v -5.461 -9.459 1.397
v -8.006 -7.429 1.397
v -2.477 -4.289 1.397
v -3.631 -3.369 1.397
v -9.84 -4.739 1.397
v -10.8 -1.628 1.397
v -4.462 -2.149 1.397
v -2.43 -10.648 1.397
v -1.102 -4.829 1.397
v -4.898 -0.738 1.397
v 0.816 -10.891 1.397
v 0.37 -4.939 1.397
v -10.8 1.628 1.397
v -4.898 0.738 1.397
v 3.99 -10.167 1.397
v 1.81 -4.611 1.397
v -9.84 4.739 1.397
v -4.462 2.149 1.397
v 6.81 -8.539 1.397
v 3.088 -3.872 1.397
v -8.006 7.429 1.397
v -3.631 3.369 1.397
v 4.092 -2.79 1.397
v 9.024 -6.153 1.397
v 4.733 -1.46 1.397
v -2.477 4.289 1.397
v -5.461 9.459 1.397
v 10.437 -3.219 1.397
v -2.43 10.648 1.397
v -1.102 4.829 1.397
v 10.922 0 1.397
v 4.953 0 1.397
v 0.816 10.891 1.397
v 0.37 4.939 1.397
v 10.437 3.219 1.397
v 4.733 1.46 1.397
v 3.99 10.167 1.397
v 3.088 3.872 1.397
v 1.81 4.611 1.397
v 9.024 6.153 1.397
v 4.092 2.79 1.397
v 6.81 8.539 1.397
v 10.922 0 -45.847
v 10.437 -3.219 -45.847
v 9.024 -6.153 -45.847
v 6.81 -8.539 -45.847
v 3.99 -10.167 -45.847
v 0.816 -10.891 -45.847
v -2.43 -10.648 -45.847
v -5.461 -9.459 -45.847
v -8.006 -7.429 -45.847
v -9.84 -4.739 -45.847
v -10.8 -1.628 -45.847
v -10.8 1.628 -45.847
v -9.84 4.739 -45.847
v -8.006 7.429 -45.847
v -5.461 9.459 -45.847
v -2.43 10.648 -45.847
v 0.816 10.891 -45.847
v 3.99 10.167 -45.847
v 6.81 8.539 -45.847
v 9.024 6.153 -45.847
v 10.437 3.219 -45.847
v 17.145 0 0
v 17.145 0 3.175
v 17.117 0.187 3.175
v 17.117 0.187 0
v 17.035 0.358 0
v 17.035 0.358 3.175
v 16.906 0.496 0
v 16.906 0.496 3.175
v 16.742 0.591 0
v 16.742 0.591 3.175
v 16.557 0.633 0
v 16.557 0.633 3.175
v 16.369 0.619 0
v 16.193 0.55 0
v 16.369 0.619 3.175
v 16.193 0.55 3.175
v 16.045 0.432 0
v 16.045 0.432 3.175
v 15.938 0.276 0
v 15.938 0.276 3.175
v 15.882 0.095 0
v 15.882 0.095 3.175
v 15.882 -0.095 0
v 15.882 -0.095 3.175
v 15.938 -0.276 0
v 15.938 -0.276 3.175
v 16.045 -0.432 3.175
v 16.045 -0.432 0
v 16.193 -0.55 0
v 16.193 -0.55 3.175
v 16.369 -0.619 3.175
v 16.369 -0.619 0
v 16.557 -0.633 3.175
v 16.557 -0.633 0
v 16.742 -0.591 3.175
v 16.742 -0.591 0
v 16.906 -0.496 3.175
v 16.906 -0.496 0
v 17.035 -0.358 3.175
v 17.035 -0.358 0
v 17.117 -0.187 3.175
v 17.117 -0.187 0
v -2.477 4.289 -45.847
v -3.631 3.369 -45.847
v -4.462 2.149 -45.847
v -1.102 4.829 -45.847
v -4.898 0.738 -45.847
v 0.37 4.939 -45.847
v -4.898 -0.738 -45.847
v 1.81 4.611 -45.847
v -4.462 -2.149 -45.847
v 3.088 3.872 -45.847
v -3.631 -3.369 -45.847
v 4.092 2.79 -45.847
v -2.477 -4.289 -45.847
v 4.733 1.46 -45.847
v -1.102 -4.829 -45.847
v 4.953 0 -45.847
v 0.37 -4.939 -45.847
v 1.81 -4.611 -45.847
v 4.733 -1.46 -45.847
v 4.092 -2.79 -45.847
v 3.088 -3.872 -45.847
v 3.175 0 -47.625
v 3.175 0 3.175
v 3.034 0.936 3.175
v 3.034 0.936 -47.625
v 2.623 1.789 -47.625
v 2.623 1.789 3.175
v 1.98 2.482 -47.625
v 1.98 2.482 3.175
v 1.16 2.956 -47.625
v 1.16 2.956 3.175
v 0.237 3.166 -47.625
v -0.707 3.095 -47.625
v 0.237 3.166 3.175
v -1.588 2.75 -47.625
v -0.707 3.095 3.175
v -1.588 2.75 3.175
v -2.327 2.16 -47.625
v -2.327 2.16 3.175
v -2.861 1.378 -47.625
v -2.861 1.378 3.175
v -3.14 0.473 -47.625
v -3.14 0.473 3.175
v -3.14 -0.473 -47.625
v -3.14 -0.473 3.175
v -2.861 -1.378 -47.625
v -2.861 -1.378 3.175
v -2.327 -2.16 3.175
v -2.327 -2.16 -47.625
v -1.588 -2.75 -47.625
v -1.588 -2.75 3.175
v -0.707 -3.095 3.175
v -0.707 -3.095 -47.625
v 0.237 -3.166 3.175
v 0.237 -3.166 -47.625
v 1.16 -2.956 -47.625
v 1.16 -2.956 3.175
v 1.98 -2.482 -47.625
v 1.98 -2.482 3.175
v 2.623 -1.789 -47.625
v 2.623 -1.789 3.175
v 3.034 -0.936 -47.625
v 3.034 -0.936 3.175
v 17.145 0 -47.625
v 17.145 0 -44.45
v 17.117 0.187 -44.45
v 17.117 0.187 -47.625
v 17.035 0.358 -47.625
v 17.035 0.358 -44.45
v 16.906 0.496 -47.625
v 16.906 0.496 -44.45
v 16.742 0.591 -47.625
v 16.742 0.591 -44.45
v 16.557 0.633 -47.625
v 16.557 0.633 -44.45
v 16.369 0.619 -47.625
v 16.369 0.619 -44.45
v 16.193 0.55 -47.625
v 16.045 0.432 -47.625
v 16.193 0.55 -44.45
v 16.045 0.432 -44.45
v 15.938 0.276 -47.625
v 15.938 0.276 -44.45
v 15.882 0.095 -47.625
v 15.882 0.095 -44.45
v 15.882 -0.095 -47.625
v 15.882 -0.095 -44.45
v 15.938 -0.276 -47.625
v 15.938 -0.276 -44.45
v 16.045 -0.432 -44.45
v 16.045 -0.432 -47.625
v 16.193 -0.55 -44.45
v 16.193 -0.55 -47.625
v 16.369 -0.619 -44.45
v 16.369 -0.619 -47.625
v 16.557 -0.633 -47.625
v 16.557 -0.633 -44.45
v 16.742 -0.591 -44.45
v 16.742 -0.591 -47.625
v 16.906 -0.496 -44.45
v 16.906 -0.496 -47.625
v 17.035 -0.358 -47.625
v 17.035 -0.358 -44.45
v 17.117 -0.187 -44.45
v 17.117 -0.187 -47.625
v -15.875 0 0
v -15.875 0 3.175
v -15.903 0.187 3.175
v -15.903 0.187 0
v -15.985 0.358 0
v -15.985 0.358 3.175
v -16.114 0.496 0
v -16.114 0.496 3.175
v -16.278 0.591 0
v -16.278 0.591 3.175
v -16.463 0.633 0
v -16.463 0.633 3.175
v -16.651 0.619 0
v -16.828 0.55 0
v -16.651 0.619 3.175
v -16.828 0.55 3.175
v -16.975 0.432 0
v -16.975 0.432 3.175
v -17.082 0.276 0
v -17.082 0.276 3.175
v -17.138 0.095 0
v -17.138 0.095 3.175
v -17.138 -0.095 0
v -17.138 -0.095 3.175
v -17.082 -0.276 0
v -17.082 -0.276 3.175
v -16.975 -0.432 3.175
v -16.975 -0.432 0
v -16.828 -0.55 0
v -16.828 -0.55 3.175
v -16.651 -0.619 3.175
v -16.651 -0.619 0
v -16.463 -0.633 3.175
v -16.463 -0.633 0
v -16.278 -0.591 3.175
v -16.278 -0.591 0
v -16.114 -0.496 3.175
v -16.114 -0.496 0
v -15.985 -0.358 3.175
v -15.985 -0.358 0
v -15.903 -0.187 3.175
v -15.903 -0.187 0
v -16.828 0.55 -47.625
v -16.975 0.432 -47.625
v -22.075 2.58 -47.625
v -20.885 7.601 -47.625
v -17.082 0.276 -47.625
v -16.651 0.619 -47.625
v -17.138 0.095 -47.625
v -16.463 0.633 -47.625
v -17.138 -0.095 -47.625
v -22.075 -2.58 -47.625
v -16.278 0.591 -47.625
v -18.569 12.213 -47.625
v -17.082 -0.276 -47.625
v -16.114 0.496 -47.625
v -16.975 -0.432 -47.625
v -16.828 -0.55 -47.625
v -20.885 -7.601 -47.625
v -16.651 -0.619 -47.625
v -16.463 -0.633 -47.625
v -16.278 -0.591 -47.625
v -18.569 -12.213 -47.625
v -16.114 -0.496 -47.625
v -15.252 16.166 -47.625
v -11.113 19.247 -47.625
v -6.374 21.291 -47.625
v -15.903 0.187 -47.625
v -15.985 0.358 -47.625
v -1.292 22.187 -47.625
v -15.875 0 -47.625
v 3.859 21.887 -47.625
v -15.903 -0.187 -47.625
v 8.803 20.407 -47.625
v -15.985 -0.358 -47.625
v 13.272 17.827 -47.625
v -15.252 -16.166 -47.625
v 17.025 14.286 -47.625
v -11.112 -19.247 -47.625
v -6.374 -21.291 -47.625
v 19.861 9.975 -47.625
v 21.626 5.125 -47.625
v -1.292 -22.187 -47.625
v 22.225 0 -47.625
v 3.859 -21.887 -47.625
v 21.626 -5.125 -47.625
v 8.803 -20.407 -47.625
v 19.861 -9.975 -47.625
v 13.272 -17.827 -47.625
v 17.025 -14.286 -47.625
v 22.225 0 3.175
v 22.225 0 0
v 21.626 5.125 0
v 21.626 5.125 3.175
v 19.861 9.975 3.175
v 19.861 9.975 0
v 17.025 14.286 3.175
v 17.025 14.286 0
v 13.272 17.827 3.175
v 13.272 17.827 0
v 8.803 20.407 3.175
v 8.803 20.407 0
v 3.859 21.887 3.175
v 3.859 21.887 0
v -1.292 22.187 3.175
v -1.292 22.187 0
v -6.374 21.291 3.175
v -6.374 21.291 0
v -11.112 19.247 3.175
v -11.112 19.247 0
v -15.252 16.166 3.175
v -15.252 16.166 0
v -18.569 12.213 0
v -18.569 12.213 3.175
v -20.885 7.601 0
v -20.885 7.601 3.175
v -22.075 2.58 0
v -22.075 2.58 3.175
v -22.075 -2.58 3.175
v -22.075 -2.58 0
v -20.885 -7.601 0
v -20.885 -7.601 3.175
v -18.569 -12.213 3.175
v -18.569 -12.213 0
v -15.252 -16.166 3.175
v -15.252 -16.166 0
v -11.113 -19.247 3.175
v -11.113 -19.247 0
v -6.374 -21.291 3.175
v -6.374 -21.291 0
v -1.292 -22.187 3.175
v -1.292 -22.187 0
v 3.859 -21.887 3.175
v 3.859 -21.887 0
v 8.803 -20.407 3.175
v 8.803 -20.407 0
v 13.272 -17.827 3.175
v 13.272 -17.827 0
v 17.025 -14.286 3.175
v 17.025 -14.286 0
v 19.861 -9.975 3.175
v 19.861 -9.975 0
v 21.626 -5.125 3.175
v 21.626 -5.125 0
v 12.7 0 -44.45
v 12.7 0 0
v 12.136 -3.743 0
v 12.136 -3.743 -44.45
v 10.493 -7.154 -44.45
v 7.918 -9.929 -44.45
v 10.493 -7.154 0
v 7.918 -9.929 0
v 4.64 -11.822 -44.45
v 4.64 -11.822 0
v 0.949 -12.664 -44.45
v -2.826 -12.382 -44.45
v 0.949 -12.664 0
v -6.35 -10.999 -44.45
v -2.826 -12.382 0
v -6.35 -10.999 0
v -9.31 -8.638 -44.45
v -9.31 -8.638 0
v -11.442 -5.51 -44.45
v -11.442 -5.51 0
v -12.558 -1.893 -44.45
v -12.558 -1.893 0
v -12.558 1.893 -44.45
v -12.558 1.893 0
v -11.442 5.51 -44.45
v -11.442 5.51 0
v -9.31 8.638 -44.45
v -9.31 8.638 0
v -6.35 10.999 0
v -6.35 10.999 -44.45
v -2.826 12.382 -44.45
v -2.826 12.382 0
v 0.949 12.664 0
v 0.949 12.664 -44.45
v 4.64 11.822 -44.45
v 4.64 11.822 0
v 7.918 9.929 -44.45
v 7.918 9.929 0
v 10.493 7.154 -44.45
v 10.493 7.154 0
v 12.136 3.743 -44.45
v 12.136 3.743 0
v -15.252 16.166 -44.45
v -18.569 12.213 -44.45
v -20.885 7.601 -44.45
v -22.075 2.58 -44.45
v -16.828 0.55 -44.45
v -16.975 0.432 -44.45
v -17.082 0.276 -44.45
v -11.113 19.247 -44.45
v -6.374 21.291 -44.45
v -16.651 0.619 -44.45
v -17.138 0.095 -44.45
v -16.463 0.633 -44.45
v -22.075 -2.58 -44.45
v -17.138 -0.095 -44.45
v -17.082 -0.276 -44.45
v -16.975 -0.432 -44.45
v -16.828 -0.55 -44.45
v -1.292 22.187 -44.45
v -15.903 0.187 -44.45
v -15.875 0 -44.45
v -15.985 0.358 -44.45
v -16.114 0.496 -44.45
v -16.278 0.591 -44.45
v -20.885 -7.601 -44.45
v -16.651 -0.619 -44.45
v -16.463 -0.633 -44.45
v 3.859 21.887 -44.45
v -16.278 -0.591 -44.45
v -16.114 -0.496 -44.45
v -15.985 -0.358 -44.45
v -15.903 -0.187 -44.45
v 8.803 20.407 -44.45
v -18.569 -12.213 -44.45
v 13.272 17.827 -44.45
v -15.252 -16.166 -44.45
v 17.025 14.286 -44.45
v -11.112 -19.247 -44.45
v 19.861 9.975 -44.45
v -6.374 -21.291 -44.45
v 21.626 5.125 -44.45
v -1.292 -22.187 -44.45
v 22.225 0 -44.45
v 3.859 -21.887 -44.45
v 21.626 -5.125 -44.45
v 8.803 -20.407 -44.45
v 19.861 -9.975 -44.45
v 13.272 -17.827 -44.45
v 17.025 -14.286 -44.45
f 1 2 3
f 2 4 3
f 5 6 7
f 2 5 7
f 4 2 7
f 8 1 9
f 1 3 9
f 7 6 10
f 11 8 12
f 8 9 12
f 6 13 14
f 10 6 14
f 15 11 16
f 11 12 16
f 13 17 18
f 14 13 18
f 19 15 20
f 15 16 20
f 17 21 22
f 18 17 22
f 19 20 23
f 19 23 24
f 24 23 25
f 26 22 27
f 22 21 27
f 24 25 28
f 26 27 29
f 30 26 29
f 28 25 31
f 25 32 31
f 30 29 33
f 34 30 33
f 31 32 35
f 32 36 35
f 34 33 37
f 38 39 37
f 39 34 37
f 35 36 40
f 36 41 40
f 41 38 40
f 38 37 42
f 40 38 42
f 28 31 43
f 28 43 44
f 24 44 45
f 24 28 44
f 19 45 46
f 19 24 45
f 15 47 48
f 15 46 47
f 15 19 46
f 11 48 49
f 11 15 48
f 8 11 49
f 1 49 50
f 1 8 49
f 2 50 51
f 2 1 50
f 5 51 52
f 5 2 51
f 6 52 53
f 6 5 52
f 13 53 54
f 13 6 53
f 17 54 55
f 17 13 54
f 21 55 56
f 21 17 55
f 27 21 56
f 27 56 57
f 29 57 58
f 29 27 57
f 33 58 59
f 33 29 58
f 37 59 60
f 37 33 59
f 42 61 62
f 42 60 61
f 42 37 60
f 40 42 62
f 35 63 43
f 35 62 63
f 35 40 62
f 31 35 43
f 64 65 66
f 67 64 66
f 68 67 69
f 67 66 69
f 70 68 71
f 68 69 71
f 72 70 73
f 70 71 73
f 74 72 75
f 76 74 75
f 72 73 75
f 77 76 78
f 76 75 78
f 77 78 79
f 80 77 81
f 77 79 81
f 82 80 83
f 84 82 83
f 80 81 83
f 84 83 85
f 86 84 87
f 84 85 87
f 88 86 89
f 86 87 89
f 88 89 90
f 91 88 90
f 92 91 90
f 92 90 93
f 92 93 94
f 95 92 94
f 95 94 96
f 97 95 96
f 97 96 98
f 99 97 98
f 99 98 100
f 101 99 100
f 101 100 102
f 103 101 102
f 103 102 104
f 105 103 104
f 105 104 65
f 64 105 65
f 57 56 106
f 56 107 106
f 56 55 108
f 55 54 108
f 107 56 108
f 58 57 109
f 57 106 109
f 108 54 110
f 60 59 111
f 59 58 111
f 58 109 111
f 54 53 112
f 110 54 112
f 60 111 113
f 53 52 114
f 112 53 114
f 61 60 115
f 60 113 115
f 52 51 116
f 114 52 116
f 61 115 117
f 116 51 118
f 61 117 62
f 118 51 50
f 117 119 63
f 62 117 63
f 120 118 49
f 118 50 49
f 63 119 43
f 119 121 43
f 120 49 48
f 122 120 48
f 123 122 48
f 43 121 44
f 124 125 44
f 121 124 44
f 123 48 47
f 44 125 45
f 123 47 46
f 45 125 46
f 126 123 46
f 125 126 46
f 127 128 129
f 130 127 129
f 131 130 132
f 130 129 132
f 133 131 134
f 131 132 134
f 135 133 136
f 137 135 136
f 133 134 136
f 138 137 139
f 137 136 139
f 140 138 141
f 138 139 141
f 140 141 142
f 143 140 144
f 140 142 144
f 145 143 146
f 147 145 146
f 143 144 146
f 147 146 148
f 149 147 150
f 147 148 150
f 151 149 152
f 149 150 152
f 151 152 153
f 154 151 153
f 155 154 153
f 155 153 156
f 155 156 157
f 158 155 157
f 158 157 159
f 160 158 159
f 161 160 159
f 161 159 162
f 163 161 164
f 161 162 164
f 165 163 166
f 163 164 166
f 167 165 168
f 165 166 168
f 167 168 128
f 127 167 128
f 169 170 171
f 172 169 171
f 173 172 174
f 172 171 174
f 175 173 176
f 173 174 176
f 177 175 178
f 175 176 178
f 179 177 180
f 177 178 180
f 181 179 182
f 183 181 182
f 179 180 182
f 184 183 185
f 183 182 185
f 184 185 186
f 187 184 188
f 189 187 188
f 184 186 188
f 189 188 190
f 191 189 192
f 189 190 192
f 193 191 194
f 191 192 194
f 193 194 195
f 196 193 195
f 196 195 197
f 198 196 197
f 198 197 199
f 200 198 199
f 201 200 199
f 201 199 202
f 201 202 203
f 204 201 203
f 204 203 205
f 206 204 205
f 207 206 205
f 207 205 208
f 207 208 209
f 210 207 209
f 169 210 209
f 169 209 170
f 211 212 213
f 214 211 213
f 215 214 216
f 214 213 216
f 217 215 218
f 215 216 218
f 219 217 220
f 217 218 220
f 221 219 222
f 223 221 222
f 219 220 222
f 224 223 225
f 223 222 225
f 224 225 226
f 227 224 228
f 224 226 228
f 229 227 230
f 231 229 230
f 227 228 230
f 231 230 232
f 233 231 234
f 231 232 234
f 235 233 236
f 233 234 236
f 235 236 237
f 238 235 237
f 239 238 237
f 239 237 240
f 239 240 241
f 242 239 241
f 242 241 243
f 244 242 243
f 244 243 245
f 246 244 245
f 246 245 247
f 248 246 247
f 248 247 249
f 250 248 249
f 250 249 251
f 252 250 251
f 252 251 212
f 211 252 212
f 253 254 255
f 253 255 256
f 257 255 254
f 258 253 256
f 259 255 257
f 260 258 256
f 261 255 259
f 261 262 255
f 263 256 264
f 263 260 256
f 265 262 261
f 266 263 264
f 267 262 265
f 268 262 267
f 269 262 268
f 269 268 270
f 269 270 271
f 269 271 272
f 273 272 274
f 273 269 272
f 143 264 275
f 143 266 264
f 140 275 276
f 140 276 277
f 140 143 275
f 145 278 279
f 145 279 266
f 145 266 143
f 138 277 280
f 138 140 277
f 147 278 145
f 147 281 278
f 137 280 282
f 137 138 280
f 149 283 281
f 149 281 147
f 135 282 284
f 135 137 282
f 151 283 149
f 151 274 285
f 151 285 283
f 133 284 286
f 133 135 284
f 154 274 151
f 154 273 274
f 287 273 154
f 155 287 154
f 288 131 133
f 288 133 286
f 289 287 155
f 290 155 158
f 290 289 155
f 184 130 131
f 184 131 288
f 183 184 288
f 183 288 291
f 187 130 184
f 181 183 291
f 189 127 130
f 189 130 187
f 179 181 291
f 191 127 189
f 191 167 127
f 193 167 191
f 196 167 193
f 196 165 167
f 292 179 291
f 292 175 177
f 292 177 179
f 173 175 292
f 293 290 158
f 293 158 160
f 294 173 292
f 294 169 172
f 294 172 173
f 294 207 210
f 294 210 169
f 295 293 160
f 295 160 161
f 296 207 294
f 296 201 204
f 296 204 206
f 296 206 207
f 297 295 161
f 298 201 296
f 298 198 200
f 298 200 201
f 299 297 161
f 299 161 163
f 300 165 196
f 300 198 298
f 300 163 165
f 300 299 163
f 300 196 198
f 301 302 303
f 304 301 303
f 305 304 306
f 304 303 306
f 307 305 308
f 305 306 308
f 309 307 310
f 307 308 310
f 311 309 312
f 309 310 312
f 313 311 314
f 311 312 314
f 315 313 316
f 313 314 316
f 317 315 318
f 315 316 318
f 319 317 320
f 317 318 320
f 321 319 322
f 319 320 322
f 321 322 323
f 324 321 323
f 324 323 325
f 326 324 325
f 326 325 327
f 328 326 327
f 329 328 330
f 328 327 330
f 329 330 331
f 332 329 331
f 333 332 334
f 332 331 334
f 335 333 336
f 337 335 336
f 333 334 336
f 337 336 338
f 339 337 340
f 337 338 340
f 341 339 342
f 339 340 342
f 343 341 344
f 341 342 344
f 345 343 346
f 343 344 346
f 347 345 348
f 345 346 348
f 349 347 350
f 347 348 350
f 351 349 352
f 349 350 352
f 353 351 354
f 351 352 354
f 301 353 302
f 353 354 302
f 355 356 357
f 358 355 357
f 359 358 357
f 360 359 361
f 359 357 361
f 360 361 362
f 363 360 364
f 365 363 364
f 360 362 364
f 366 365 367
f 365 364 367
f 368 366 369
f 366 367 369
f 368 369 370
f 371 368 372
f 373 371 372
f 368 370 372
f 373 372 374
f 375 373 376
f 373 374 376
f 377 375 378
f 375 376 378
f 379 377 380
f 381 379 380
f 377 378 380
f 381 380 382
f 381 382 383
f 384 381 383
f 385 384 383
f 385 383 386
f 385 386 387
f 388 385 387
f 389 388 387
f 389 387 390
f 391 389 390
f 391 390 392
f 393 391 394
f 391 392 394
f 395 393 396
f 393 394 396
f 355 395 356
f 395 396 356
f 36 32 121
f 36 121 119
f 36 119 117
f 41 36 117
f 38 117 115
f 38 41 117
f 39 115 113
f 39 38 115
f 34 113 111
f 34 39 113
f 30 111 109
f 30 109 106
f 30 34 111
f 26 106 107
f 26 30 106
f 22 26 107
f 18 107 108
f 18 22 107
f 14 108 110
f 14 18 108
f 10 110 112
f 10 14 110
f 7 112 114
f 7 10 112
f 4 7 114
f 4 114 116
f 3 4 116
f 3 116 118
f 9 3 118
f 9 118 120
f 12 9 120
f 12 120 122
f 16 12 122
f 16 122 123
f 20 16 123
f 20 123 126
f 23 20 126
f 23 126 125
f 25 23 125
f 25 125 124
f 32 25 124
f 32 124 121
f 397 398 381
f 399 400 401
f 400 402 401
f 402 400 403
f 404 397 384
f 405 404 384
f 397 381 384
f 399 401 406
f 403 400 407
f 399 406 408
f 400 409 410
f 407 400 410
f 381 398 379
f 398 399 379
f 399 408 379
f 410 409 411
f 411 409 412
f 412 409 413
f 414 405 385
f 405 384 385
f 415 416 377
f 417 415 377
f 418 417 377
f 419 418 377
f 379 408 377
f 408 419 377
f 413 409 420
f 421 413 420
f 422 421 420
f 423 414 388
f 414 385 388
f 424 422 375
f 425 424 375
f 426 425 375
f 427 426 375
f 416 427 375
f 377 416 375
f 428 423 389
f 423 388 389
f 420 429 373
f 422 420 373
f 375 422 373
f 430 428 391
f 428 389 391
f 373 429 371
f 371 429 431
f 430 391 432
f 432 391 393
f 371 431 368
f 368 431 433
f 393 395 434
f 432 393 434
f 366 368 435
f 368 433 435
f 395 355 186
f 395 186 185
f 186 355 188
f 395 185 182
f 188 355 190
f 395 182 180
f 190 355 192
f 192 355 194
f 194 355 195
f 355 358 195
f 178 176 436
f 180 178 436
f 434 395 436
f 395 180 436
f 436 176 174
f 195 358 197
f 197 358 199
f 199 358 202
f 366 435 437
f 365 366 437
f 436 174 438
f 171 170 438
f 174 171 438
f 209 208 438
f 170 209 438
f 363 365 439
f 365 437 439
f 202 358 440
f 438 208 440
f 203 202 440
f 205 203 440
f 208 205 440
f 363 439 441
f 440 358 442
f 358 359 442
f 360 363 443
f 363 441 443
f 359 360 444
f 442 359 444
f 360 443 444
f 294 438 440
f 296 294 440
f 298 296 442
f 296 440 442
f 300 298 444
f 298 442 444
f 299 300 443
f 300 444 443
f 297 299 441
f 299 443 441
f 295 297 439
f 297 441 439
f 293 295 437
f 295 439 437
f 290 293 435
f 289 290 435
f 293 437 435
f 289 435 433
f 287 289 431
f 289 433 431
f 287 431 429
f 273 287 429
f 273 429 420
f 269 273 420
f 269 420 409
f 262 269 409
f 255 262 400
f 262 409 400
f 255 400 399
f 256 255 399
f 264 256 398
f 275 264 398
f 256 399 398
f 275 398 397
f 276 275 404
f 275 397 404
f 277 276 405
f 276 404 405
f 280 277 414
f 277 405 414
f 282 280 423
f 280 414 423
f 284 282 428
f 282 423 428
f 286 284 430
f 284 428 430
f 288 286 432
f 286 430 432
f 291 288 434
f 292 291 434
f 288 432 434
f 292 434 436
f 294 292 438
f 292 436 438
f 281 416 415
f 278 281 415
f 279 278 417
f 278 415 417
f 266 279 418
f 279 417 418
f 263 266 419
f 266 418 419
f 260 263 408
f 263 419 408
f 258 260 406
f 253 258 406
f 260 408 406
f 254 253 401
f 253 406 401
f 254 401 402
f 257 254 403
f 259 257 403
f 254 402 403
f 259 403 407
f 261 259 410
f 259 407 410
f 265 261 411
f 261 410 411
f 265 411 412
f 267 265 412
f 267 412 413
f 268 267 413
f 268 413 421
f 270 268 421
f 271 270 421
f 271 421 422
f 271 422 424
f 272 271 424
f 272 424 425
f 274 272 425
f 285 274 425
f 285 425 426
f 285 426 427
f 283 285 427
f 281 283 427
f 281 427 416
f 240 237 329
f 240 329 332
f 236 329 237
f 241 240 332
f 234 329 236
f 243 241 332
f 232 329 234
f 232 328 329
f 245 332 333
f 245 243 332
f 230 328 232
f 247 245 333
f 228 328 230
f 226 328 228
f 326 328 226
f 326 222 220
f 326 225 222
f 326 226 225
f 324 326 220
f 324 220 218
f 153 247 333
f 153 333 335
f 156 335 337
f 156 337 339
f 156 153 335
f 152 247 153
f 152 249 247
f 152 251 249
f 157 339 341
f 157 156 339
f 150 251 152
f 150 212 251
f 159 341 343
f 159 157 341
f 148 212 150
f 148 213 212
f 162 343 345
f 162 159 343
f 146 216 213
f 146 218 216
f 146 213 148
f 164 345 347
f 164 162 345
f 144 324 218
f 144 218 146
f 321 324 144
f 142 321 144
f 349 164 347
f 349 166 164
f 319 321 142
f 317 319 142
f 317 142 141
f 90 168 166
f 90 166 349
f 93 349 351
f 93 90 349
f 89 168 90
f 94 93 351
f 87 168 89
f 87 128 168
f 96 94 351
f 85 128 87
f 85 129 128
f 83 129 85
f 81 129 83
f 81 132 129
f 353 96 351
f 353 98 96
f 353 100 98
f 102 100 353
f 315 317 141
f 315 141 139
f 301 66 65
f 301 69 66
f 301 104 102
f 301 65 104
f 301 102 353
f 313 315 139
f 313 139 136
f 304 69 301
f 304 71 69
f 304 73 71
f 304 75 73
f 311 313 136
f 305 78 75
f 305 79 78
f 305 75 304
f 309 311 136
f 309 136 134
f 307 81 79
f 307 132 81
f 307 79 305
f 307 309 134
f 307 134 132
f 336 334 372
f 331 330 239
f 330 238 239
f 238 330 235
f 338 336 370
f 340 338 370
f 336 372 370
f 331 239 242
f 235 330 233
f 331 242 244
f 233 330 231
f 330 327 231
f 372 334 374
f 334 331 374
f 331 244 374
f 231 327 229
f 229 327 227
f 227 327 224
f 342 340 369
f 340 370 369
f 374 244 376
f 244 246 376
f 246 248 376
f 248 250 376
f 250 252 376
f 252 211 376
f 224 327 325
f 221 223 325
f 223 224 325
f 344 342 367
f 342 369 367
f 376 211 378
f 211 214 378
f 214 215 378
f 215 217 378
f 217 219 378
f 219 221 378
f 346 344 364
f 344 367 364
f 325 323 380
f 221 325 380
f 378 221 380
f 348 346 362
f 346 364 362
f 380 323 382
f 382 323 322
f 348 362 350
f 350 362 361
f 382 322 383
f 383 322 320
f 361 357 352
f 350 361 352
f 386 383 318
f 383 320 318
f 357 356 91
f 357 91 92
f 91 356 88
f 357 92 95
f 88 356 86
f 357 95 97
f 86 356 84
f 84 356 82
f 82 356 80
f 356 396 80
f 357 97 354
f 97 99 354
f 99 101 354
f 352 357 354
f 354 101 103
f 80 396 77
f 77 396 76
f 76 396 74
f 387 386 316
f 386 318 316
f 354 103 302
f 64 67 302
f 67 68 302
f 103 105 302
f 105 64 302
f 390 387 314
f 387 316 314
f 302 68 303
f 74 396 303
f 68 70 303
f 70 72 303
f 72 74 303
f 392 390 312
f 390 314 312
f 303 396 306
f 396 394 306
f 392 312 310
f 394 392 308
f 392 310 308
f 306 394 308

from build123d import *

# Parameters (mm, degrees)
F0_R     = 22.225
F1_DEPTH = 3.175
F2_R     = 12.7
F3_DEPTH = 44.45
F4_R     = 22.225
F5_DEPTH = 3.175
F6_R     = 0.635
F7_DEPTH = 50.8
F8_T     = -1.778


# Not quite as in the source:
# - a length typed as a fraction of an inch, garbled in the dataset ("3 / 203.2 mm" for 3/8 in), is restored


with BuildPart() as f1:
    # F0 (on Top) → F1 (new body)
    with BuildSketch(Plane.XY):
        Circle(F0_R)
    extrude(amount=F1_DEPTH)

    # F2 (on face) → F3 (join)
    with BuildSketch(Plane(origin=(0, 0, 0), x_dir=(1, 0, 0), z_dir=(0, 0, -1))):
        Circle(F2_R)
    extrude(amount=F3_DEPTH)

    # F4 (on face) → F5 (join)
    with BuildSketch(Plane(origin=(0, 0, -44.45), x_dir=(1, 0, 0), z_dir=(0, 0, -1))):
        Circle(F4_R)
    extrude(amount=F5_DEPTH)

    # F6 (on face) → F7 (cut, through all)
    with BuildSketch(Plane.XY.offset(3.175)):
        with BuildLine():
            ThreePointArc((-3.175, 0), (0, -3.175), (3.175, 0))
            ThreePointArc((3.175, 0), (0, 3.175), (-3.175, 0))
        make_face()
        with BuildLine():
            ThreePointArc((-17.145, 0), (-16.51, -0.635), (-15.875, 0))
            Line((-15.875, 0), (-17.145, 0))
        make_face()
        with BuildLine():
            Line((-17.145, 0), (-15.875, 0))
            ThreePointArc((-15.875, 0), (-16.51, 0.635), (-17.145, 0))
        make_face()
        with Locations((16.51, 0)):
            Circle(F6_R)
    extrude(amount=-F7_DEPTH, mode=Mode.SUBTRACT)

    # F8 (hollow: no face is removed)
    offset(amount=F8_T, kind=Kind.INTERSECTION, mode=Mode.SUBTRACT)


solid = f1.part
